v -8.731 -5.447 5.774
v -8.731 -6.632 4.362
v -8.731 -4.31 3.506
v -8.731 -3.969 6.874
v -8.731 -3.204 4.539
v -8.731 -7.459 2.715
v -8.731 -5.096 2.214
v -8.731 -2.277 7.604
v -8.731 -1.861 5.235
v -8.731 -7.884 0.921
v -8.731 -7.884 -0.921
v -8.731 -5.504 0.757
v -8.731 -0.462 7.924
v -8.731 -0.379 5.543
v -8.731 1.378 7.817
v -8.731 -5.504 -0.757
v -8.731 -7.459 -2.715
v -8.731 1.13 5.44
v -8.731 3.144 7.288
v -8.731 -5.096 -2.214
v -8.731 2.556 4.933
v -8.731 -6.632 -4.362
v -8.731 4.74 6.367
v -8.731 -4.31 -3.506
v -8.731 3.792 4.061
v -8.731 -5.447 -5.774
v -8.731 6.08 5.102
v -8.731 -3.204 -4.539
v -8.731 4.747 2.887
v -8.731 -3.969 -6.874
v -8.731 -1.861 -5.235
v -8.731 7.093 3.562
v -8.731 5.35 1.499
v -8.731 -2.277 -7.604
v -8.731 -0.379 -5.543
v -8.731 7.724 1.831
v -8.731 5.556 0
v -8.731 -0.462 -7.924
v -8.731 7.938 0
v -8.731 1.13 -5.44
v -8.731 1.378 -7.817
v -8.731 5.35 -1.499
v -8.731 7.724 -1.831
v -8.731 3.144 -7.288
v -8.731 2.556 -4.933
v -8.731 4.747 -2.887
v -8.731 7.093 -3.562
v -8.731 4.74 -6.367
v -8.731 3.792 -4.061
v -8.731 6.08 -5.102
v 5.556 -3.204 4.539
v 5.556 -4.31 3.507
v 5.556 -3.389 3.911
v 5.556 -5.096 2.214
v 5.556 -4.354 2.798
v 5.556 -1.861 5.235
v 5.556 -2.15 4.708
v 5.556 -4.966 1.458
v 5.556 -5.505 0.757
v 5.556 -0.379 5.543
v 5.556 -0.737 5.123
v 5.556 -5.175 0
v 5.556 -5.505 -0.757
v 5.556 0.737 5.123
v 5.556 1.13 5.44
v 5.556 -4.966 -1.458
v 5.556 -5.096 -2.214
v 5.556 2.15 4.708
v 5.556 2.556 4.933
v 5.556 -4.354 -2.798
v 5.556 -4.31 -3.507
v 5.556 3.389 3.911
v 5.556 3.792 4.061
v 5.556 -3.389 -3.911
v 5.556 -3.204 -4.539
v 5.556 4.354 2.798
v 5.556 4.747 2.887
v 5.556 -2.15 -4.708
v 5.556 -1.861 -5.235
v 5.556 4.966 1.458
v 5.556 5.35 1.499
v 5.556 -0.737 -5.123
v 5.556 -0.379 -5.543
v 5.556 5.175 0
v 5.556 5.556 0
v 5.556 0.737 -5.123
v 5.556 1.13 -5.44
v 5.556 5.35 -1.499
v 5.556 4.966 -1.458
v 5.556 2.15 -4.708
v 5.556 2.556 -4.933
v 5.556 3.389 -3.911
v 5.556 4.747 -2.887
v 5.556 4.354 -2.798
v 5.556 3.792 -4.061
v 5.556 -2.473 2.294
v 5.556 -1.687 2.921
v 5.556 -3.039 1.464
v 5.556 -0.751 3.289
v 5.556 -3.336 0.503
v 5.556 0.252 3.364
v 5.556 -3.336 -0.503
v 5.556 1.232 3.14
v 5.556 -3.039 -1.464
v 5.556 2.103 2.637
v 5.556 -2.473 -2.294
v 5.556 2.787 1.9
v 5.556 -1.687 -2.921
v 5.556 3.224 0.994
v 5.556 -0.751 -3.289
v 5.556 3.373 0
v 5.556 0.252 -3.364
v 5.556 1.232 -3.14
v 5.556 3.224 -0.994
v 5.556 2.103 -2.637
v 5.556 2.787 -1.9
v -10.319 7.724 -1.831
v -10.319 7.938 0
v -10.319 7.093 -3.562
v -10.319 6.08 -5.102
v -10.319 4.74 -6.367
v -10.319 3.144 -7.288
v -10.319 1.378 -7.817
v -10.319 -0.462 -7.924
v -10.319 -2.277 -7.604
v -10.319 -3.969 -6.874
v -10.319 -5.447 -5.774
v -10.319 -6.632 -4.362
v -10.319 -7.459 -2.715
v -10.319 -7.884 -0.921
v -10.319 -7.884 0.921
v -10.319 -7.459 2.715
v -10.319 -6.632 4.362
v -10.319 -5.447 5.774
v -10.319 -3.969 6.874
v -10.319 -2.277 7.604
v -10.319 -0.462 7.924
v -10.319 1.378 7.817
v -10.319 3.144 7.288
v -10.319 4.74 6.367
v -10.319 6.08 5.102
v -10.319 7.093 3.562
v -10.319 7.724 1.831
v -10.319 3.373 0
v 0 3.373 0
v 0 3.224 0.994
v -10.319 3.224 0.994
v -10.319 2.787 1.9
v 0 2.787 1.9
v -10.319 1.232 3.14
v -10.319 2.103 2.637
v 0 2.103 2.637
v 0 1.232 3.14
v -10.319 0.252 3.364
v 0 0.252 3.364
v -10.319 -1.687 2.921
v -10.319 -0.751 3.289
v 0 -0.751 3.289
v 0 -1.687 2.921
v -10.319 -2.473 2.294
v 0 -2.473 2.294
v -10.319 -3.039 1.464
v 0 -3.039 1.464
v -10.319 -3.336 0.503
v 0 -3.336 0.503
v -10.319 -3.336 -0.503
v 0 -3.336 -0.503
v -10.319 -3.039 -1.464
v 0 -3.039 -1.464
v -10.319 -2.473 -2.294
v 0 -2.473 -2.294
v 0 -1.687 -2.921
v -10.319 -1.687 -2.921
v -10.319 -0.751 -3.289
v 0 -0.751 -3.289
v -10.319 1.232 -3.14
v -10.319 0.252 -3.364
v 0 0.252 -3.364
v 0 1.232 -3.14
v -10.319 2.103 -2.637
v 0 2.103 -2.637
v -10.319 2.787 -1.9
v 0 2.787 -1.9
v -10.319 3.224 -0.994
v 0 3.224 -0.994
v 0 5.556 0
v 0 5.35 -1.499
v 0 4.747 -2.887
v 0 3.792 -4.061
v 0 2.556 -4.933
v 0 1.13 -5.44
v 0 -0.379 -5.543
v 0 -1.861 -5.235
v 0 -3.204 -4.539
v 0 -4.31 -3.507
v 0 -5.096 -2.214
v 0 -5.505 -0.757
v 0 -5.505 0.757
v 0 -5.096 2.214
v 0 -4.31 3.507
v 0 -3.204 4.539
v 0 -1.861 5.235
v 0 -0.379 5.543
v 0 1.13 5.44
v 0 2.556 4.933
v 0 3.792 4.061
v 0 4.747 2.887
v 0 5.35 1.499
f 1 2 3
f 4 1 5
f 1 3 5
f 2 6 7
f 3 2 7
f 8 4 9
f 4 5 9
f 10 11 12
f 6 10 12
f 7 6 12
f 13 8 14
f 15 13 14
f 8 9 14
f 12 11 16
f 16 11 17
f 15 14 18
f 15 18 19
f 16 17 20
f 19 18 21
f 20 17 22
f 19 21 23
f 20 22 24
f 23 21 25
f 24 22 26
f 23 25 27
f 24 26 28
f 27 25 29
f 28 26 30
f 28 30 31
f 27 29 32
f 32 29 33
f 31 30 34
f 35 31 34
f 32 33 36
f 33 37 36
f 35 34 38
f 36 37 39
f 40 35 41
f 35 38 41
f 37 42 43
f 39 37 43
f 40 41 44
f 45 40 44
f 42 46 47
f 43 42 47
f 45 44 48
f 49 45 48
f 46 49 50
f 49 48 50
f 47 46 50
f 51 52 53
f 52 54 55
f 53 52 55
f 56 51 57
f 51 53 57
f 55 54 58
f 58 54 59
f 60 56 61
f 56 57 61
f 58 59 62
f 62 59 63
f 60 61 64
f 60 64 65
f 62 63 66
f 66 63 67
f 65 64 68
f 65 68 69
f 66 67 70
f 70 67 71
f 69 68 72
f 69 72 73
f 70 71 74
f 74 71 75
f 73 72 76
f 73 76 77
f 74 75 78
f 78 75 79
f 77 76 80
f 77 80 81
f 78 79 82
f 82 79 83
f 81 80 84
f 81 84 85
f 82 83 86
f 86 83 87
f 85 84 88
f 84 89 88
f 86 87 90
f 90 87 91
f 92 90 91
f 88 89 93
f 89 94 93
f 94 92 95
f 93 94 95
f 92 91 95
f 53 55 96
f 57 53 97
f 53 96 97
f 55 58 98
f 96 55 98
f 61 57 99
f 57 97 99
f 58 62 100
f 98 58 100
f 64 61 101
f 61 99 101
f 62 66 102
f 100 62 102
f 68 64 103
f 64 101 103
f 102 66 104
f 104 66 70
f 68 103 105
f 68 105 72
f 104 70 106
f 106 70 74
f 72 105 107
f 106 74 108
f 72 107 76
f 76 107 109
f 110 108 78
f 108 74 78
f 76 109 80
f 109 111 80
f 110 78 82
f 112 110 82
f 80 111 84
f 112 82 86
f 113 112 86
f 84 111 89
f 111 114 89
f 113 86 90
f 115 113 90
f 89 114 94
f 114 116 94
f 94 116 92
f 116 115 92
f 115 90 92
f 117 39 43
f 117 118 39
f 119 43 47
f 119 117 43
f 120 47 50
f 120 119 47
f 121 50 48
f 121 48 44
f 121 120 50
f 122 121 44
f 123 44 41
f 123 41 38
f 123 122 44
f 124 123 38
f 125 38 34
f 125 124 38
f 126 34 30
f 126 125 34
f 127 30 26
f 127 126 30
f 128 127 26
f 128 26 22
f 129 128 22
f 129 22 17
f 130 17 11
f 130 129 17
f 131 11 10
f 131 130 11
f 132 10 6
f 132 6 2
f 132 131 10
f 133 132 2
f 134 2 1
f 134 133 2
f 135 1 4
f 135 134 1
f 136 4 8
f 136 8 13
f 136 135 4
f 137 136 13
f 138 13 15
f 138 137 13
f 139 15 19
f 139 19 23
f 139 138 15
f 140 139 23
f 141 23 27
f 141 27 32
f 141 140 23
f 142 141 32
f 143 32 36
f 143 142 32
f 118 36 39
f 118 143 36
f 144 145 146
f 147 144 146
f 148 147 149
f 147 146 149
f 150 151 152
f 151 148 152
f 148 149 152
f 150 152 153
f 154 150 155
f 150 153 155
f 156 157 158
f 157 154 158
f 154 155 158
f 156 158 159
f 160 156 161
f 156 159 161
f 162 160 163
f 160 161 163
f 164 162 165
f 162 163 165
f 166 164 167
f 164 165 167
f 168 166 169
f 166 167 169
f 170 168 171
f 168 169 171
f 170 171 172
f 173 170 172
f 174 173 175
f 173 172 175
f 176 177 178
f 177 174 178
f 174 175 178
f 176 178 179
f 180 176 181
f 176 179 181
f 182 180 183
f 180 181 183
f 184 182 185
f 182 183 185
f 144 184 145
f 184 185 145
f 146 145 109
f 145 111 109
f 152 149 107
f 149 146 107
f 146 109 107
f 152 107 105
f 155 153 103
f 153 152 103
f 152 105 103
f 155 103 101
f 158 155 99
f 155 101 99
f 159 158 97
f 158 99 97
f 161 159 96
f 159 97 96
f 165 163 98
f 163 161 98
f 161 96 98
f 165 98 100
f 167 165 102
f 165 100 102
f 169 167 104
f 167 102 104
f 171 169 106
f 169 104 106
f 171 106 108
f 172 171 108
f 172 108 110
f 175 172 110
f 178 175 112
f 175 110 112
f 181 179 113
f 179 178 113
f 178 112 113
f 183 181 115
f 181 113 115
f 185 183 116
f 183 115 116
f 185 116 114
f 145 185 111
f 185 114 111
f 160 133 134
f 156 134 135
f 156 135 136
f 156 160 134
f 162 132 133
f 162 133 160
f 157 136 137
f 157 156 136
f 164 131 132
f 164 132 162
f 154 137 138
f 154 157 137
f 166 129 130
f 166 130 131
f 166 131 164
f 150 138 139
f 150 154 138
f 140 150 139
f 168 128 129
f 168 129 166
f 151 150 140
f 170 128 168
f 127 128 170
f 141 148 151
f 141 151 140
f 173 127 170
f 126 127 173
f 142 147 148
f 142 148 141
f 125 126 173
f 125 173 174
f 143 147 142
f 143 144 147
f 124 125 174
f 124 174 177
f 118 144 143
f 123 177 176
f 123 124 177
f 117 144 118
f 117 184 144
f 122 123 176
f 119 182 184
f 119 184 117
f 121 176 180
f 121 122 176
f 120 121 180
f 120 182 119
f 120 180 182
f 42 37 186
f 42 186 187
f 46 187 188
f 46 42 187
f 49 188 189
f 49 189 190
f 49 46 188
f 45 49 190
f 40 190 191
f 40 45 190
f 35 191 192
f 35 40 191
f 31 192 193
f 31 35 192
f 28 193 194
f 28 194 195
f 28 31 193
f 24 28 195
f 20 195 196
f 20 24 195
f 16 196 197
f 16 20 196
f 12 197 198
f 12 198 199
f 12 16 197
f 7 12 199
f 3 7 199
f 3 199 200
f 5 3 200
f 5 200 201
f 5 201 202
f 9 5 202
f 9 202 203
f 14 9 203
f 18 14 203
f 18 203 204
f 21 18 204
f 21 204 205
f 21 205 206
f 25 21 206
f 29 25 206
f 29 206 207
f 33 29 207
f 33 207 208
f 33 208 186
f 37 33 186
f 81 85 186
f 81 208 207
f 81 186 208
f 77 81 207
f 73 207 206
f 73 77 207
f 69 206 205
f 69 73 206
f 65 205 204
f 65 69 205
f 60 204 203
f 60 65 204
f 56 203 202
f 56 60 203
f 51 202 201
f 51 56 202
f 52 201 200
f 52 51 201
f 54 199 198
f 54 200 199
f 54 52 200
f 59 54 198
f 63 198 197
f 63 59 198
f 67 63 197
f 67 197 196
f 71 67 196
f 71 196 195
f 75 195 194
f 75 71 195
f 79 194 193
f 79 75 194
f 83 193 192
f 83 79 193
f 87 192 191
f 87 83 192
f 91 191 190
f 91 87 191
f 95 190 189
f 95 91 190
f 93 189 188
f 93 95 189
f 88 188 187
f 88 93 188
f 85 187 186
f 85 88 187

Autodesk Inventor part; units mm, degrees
ref_plane "YZ Plane" through (0, 0, 0) normal (1, 0, 0) x (0, 1, 0)
ref_plane "XZ Plane" through (0, 0, 0) normal (0, 1, 0) x (-1, 0, 0)
ref_plane "XY Plane" through (0, 0, 0) normal (0, 0, 1) x (1, 0, 0)
sketch "Sketch1" plane through (0, 0, 0) normal (0, 0, 1) x (1, 0, 0)
  line L0 (0, 0) -> (0, 12.7)
  line L1 (0, 5.5563) -> (5.5562, 5.5563)
  line L2 (0, 7.9375) -> (26.1937, 7.9375)
  line L3 (26.1937, 7.9375) -> (26.1937, 5.5563)
  line L4 (26.1937, 5.5563) -> (26.1937, 0)
  line L5 (26.1937, 0) -> (0, 0)
  line L6 (26.1938, 6.35) -> (34.3852, 6.35)
  line L7 (26.1937, 0) -> (34.3852, 0)
  line L8 (34.3852, 0) -> (34.3852, 6.35)
  line L9 (16.6687, 7.9375) -> (16.6687, 0)
  circle A0 centre (16.6687, 7.5565) radius 2.3813
  circle A1 centre (16.6687, 5.4928) radius 2.3813
  circle A2 centre (10.3187, 7.5565) radius 2.3813
  circle A3 centre (10.3187, 5.4928) radius 2.3813
  line L10 (10.3187, 7.9375) -> (10.3187, 0)
  line L11 (0, 5.1753) -> (26.1938, 5.1753)
  line L12 (8.7312, 5.1753) -> (8.7312, 0)
  line L13 (5.5562, 5.1753) -> (5.5562, 3.3734)
  line L14 (18.2562, 5.1753) -> (18.2562, 0)
  line L15 (21.4312, 5.1753) -> (21.4312, 0)
  line L16 (0, 3.1115) -> (26.1937, 3.1115)
  line L17 (5.5562, 3.1115) -> (8.7312, 5.1753)
  line L18 (18.2562, 5.1753) -> (21.4312, 3.1115)
  line L19 (11.9062, 5.1753) -> (11.9062, 0)
  line L20 (15.0812, 5.1753) -> (15.0812, 0)
  line L21 (11.9062, 5.1753) -> (15.0812, 3.1115)
  line L22 (21.4312, 3.3734) -> (34.3852, 3.3734)
  line L23 (24.6062, 3.3734) -> (24.6062, 0)
  line L24 (21.4312, 3.3734) -> (20.1197, 5.5563)
  line L25 (26.1937, 3.1115) -> (30.9563, 3.1115)
  line L26 (30.9563, 3.1115) -> (30.9563, 0)
  line L27 (31.75, 3.3734) -> (31.75, 0)
  line L28 (31.75, 0) -> (29.723, 3.3734)
  line L29 (0, 7.9375) -> (-8.7312, 7.9375)
  line L30 (0, 3.3734) -> (5.5562, 3.3734)
  line L31 (5.5562, 5.1753) -> (5.5562, 5.5563)
  line L32 (5.5562, 5.5563) -> (26.1937, 5.5563)
  line L33 (0, 5.5563) -> (-8.7312, 5.5562)
  line L34 (-10.3187, 7.9375) -> (-10.3187, 3.3734)
  line L35 (-10.3187, 3.3734) -> (0, 3.3734)
  line L36 (-8.7312, 7.9375) -> (-8.7312, 5.5562)
  line L37 (-8.7312, 7.9375) -> (-10.3187, 7.9375)
  line L38 (5.5562, 3.3734) -> (5.5562, 0)
  dimension "d0" = 12.7
  dimension "d1" = 5.5563
  dimension "d2" = 7.9375
  dimension "d3" = 26.1938
  dimension "d4" = 8.1915
  dimension "d5" = 6.35
  dimension "d6" = 9.525
  dimension "d7" = 6.35
  dimension "d8" = 0.381
  dimension "d9" = 0.381
  dimension "d10" = 0.0635
  dimension "d11" = 0.0635
  dimension "d12" = 1.5875
  dimension "d13" = 4.7625
  dimension "d14" = 1.5875
  dimension "d15" = 4.7625
  dimension "d16" = 3.1115
  dimension "d17" = 1.5875
  dimension "d18" = 4.7625
  dimension "d19" = 3.3734
  dimension "d20" = 3.175
  dimension "d21" = 31
  dimension "d22" = 9.525
  dimension "d23" = 9.525
  dimension "d24" = 0.7937
  dimension "d25" = 31
  dimension "d27" = 3.3734
  dimension "d33" = 4.7625
  dimension "d34" = 8.7312
  dimension "d35" = 1.5875
revolve "Revolution1" add sketch "Sketch1" angle 360 about axis through (26.1937, 0, 0) along (-1, 0, 0) contours L35 L34 L37 L36 L33 L0 | L0 L11 L13 L30 | L0 L1 L31 L11
equation "\"d1\" = d28"
equation "\"d2\" = d29"
equation "\"d8\" = d30"
equation "\"d9\" = d8"
equation "\"d10\" = d31"
equation "\"d11\" = d10"
equation "\"d16\" = d32"
equation "\"d17\" = d12"
equation "\"d18\" = d13"
equation "\"d23\" = d22"
equation "\"d25\" = d21"
equation "\"d27\" = d19"
equation "\"d28\" = 5.55625"
equation "\"d29\" = 7.9375"
equation "\"d30\" = 0.381"
equation "\"d31\" = 0.0635"
equation "\"d32\" = 3.1115"
properties part number "Output Shaft Insert"
